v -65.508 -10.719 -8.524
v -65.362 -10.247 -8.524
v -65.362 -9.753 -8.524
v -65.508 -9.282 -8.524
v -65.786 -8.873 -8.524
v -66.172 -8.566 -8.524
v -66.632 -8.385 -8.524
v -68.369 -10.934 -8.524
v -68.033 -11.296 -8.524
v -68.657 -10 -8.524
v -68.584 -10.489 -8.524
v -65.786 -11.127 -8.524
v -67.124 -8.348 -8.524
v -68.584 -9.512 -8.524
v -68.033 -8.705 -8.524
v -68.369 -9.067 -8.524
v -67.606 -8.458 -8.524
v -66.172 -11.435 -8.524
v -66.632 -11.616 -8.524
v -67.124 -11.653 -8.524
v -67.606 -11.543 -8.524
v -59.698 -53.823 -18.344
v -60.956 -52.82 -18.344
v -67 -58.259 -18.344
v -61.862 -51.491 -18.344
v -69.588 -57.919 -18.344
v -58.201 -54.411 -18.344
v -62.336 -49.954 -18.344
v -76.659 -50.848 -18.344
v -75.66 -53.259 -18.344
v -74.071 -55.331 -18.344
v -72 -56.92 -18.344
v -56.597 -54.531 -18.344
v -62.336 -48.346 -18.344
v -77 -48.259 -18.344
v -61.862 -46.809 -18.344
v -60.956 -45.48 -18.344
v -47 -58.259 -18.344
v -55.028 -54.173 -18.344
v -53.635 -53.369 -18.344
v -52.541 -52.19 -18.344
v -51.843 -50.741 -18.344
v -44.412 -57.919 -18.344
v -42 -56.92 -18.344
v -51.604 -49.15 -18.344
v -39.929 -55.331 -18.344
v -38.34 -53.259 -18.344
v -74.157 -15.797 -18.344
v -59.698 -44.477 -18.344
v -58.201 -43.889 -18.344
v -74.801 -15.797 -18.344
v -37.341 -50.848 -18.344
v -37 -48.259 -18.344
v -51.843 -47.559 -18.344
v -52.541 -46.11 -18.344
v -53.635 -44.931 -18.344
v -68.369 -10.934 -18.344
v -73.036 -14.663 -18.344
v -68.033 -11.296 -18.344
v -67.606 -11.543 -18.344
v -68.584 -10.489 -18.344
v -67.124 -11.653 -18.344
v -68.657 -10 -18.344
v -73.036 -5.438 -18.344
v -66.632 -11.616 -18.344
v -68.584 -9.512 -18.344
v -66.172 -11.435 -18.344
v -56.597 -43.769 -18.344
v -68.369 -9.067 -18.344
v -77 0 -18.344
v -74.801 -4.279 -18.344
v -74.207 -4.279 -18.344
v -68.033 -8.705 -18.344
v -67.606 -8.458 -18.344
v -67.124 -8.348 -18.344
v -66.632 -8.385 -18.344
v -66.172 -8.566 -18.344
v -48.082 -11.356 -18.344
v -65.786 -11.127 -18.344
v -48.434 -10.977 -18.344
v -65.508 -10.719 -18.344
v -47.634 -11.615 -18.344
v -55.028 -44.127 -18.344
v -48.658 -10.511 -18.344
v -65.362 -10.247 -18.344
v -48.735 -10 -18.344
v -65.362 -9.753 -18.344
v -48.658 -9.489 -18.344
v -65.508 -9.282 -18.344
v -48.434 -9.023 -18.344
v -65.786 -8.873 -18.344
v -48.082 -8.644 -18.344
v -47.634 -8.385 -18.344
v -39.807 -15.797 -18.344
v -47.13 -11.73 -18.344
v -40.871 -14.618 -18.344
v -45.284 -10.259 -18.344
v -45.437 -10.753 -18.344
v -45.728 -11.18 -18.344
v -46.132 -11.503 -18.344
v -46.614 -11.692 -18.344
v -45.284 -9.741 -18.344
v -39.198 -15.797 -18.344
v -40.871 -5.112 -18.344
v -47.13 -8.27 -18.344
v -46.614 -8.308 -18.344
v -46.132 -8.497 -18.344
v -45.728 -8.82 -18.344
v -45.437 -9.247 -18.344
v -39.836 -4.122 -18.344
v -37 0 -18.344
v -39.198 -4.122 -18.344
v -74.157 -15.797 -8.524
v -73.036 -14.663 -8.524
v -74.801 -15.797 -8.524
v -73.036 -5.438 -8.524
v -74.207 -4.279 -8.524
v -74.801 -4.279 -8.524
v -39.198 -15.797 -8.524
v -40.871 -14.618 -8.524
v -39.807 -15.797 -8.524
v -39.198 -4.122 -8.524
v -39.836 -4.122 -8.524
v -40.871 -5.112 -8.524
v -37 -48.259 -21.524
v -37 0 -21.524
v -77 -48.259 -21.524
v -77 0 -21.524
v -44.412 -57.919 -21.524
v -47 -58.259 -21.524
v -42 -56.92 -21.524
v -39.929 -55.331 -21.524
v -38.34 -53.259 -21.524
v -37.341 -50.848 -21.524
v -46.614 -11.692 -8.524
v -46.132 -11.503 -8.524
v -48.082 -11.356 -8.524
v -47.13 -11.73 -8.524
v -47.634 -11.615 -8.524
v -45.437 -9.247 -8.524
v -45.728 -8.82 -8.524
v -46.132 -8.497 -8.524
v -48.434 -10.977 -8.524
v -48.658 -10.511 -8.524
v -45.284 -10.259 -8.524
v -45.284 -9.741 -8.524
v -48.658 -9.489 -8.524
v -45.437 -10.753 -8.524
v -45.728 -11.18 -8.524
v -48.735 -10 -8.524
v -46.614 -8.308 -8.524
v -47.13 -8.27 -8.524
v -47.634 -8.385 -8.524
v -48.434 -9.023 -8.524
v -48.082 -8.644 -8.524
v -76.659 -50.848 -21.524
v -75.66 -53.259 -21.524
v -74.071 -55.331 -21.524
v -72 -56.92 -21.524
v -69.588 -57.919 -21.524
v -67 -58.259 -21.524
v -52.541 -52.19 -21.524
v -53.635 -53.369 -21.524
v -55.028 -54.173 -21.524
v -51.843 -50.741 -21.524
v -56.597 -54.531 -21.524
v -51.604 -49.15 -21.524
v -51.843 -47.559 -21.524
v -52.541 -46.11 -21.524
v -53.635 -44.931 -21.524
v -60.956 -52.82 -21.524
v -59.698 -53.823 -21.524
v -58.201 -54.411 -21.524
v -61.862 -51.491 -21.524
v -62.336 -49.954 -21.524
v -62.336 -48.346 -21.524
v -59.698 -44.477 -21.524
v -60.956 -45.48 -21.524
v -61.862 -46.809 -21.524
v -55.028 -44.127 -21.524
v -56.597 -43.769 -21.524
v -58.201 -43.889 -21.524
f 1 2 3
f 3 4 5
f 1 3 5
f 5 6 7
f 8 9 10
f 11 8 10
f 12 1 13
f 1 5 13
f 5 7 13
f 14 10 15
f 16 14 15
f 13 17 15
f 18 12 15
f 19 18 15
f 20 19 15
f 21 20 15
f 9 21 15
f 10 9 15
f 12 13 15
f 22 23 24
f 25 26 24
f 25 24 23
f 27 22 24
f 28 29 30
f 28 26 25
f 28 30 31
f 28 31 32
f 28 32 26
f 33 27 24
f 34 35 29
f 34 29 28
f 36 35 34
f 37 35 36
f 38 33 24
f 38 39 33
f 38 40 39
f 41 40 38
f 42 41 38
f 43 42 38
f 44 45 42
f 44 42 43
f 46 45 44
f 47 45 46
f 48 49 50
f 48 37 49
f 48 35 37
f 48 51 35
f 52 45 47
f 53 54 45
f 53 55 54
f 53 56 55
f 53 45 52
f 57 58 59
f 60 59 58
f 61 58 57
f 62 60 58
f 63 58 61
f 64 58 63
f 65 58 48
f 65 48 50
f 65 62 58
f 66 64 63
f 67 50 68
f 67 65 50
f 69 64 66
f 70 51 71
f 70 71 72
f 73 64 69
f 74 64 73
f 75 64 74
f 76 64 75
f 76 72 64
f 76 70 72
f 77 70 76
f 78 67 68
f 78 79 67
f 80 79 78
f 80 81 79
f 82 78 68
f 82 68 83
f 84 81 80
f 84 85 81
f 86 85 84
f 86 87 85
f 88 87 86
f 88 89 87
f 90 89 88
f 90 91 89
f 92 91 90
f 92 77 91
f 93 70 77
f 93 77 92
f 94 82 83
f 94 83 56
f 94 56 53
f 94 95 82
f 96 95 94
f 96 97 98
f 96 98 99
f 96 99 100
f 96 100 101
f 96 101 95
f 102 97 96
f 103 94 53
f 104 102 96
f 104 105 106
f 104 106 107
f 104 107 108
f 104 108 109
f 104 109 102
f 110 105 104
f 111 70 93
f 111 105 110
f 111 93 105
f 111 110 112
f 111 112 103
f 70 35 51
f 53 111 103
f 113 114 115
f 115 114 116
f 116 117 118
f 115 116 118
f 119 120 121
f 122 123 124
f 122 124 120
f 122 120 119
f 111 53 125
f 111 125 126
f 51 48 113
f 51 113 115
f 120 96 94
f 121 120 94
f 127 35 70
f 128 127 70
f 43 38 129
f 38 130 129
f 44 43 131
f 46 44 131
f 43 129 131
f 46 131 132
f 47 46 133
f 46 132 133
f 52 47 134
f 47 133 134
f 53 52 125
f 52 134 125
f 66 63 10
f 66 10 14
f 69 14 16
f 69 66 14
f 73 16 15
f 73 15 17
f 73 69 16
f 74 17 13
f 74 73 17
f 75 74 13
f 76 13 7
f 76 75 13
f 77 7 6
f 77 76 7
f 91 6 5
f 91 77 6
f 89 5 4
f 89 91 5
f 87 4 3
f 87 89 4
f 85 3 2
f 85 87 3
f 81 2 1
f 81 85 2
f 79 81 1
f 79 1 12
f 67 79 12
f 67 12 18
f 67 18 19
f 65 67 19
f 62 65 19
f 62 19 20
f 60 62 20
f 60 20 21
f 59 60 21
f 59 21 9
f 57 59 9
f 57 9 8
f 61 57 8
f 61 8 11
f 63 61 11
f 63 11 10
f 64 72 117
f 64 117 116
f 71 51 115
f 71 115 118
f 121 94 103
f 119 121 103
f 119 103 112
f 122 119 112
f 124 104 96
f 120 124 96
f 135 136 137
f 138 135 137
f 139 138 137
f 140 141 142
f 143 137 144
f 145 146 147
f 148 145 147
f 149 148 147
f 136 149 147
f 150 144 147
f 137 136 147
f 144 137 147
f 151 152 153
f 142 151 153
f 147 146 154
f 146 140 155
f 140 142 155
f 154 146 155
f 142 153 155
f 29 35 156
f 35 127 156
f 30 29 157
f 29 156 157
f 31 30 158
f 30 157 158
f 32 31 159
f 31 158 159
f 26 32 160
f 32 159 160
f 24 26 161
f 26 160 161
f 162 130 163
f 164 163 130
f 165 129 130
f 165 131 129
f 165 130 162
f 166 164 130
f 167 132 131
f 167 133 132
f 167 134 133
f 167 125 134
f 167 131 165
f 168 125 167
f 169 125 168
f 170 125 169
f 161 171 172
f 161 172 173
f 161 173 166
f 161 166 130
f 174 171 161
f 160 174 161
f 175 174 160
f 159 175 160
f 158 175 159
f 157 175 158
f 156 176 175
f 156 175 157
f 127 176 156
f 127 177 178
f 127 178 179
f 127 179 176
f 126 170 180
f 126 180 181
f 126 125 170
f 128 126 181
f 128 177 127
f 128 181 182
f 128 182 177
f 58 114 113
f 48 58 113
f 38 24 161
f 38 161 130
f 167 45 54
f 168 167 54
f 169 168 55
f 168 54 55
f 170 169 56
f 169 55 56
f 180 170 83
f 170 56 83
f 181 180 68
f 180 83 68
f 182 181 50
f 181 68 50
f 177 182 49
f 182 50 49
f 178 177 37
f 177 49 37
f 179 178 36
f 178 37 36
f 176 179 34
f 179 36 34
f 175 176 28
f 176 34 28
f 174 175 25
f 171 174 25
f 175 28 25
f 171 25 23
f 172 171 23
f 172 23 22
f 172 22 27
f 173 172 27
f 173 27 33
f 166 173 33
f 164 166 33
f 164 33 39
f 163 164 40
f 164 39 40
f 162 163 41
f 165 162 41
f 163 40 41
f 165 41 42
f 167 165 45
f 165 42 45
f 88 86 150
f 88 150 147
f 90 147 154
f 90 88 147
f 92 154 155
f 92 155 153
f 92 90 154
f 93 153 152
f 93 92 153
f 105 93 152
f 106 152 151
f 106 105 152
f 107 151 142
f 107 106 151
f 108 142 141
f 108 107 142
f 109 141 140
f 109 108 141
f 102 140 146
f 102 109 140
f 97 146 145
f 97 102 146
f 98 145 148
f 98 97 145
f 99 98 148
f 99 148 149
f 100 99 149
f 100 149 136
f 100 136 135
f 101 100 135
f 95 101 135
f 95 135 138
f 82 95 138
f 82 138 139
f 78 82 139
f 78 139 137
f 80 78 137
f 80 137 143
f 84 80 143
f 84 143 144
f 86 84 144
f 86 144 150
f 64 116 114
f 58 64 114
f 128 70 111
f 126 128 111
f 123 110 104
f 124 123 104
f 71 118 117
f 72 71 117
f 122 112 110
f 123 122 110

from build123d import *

# Parameters (mm, degrees)
BOSS_EXTRUDE1_START = -18.343704
SKETCH1_W           = 40
SKETCH1_H           = 58.259460065
SKETCH1_R           = 5.396381747
BOSS_EXTRUDE1_DEPTH = 3.18
FILLET1_R           = 10
SKETCH2_R           = 1.735008093
SKETCH2_R_2         = 1.656779544
BOSS_EXTRUDE2_DEPTH = 13


with BuildPart() as part:
    # Sketch1 → Boss-Extrude1 (new body)
    with BuildSketch(Plane.XY.offset(BOSS_EXTRUDE1_START)):
        with Locations((-57, -29.129730033)):
            Rectangle(SKETCH1_W, SKETCH1_H)
        with Locations((-57, -49.150000002)):
            Circle(SKETCH1_R, mode=Mode.SUBTRACT)
    extrude(amount=-BOSS_EXTRUDE1_DEPTH)

    # Fillet1
    fillet1_edges = [part.edges().sort_by_distance(p)[0] for p in [
        (-37, -58.259460066, -19.933704),
        (-77, -58.259460066, -19.933704),
    ]]
    fillet(fillet1_edges, radius=FILLET1_R)

    # Sketch2 → Boss-Extrude2 (add)
    with BuildSketch(Plane(origin=(0, 0, -21.523704006), x_dir=(-1, 0, 0), z_dir=(0, 0, -1))):
        with Locations((47.000000001, -10.000000002)):
            Circle(SKETCH2_R)
        with Locations((67.000376739, -10.000360351)):
            Circle(SKETCH2_R_2)
        Polygon((74.800685175, -15.79650853), (74.800685175, -4.278676416), (74.207239255, -4.278676416), (73.035580783, -5.437870437), (73.035580783, -14.663272101), (74.156761506, -15.79650853), align=None)
        Polygon((39.198491865, -15.79650853), (39.198491865, -4.122433506), (39.836367638, -4.122433506), (40.870792952, -5.11185736), (40.870792952, -14.618450275), (39.807051778, -15.79650853), align=None)
    extrude(amount=-BOSS_EXTRUDE2_DEPTH)


solid = part.part
